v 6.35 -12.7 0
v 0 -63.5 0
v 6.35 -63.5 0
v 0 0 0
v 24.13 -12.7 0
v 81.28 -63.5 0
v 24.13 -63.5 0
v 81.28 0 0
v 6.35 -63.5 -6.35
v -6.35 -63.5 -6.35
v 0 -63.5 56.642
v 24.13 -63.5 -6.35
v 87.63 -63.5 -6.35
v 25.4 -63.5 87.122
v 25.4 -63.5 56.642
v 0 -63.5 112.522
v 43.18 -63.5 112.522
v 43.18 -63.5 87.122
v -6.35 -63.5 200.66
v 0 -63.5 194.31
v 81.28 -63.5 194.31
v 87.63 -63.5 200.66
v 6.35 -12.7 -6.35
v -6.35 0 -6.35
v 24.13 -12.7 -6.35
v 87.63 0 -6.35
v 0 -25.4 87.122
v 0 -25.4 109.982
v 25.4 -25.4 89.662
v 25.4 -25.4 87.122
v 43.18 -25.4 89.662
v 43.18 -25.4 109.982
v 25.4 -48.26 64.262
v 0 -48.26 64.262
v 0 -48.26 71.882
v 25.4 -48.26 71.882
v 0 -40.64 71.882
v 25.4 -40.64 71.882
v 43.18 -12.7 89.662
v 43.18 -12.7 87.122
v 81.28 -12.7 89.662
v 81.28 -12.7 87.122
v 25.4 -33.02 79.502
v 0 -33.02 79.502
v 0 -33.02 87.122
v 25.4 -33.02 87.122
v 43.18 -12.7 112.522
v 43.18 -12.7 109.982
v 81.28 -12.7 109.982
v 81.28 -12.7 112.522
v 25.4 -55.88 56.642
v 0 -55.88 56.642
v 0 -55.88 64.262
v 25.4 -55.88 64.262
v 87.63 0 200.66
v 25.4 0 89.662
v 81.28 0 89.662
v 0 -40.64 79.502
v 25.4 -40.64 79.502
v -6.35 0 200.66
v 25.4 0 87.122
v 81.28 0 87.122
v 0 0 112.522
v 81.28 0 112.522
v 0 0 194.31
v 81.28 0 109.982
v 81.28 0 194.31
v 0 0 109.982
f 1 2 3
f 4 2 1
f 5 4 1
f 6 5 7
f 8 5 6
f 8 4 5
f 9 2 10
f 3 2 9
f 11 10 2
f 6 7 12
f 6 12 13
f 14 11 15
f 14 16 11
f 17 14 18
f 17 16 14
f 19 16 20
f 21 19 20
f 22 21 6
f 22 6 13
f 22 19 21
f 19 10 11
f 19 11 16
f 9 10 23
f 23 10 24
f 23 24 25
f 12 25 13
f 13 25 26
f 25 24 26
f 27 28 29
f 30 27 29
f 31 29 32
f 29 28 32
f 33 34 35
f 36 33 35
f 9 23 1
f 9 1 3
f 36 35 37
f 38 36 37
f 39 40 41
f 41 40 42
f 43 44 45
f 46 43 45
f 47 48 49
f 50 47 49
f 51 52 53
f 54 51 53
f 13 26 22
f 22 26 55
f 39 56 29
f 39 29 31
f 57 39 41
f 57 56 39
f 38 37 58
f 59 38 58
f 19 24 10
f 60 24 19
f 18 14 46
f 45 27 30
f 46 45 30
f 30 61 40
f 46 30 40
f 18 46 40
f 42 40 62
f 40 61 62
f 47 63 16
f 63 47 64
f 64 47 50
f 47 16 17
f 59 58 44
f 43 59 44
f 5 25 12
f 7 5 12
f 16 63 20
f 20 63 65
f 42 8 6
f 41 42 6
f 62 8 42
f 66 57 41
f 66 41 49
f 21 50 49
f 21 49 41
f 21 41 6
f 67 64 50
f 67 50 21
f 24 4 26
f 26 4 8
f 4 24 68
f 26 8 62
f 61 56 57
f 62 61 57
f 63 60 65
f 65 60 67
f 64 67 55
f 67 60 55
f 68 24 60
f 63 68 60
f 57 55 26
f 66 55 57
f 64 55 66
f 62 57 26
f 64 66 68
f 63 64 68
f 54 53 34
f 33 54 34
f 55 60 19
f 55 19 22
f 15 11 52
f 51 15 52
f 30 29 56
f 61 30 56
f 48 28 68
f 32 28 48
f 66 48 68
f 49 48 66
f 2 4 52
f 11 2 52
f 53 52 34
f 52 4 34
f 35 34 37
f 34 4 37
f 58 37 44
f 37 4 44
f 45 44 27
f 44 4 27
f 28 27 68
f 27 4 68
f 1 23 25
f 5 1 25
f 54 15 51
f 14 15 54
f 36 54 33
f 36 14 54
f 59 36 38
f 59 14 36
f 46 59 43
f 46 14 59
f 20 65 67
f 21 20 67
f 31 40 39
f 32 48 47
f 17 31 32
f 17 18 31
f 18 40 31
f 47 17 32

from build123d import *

# Parameters (mm, degrees)
F0_W      = 93.98
F0_H      = 207.01
F0_W_2    = 81.28
F0_H_2    = 87.122
F0_H_3    = 104.648
F1_DEPTH  = 63.5
F2_W      = 17.78
F2_H      = 50.8
F3_DEPTH  = 6.35
F4_W      = 25.4
F4_H      = 20.32
F5_DEPTH  = 38.1
F6_W      = 25.4
F6_H      = 25.4
F7_DEPTH  = 2.54
F9_DEPTH  = 25.4
F10_W     = 81.28
F10_H     = 2.54
F11_DEPTH = 63.5
F12_W     = 38.1
F12_H     = 50.8
F13_DEPTH = 25.4
F14_W     = 17.78
F14_H     = 20.32
F15_DEPTH = 38.1


with BuildPart() as f1:
    # F0 (on Front) → F1 (new body)
    with BuildSketch(Plane.XZ):
        with Locations((40.64, 97.155)):
            Rectangle(F0_W, F0_H)
        with Locations((40.64, 43.561)):
            Rectangle(F0_W_2, F0_H_2, mode=Mode.SUBTRACT)
        with Locations((40.64, 141.986)):
            Rectangle(F0_W_2, F0_H_3, mode=Mode.SUBTRACT)
    extrude(amount=F1_DEPTH)

    # F2 (on face) → F3 (cut, through all)
    with BuildSketch(Plane(origin=(0, 0, -6.35), x_dir=(1, 0, 0), z_dir=(0, 0, -1))):
        with Locations((15.24, 38.1)):
            Rectangle(F2_W, F2_H)
    extrude(amount=-F3_DEPTH, mode=Mode.SUBTRACT)

    # F4 (on face) → F5 (join)
    with BuildSketch(Plane.XZ.offset(63.5)):
        with Locations((12.7, 99.822)):
            Rectangle(F4_W, F4_H)
    extrude(amount=-F5_DEPTH)

    # F6 (on face) → F7 (cut, through all)
    with BuildSketch(Plane.XY.offset(89.662)):
        with Locations((12.7, -12.7)):
            Rectangle(F6_W, F6_H)
    extrude(amount=-F7_DEPTH, mode=Mode.SUBTRACT)

    # F8 (on face) → F9 (join, through all)
    with BuildSketch(Plane.YZ):
        Polygon((-33.02, 79.502), (-33.02, 87.122), (-63.5, 87.122), (-63.5, 56.642), (-55.88, 56.642), (-55.88, 64.262), (-48.26, 64.262), (-48.26, 71.882), (-40.64, 71.882), (-40.64, 79.502), align=None)
    extrude(amount=F9_DEPTH)

    # F10 (on face) → F11 (join, through all)
    with BuildSketch(Plane.XZ.offset(63.5)):
        with Locations((40.64, 111.252)):
            Rectangle(F10_W, F10_H)
    extrude(amount=-F11_DEPTH)

    # F12 (on face) → F13 (cut, through all)
    with BuildSketch(Plane(origin=(0, 0, 87.122), x_dir=(1, 0, 0), z_dir=(0, 0, -1))):
        with Locations((62.23, 38.1)):
            Rectangle(F12_W, F12_H)
    extrude(amount=-F13_DEPTH, mode=Mode.SUBTRACT)

    # F14 (on face) → F15 (join, through all)
    with BuildSketch(Plane.XZ.offset(63.5)):
        with Locations((34.29, 99.822)):
            Rectangle(F14_W, F14_H)
    extrude(amount=-F15_DEPTH)


solid = f1.part
